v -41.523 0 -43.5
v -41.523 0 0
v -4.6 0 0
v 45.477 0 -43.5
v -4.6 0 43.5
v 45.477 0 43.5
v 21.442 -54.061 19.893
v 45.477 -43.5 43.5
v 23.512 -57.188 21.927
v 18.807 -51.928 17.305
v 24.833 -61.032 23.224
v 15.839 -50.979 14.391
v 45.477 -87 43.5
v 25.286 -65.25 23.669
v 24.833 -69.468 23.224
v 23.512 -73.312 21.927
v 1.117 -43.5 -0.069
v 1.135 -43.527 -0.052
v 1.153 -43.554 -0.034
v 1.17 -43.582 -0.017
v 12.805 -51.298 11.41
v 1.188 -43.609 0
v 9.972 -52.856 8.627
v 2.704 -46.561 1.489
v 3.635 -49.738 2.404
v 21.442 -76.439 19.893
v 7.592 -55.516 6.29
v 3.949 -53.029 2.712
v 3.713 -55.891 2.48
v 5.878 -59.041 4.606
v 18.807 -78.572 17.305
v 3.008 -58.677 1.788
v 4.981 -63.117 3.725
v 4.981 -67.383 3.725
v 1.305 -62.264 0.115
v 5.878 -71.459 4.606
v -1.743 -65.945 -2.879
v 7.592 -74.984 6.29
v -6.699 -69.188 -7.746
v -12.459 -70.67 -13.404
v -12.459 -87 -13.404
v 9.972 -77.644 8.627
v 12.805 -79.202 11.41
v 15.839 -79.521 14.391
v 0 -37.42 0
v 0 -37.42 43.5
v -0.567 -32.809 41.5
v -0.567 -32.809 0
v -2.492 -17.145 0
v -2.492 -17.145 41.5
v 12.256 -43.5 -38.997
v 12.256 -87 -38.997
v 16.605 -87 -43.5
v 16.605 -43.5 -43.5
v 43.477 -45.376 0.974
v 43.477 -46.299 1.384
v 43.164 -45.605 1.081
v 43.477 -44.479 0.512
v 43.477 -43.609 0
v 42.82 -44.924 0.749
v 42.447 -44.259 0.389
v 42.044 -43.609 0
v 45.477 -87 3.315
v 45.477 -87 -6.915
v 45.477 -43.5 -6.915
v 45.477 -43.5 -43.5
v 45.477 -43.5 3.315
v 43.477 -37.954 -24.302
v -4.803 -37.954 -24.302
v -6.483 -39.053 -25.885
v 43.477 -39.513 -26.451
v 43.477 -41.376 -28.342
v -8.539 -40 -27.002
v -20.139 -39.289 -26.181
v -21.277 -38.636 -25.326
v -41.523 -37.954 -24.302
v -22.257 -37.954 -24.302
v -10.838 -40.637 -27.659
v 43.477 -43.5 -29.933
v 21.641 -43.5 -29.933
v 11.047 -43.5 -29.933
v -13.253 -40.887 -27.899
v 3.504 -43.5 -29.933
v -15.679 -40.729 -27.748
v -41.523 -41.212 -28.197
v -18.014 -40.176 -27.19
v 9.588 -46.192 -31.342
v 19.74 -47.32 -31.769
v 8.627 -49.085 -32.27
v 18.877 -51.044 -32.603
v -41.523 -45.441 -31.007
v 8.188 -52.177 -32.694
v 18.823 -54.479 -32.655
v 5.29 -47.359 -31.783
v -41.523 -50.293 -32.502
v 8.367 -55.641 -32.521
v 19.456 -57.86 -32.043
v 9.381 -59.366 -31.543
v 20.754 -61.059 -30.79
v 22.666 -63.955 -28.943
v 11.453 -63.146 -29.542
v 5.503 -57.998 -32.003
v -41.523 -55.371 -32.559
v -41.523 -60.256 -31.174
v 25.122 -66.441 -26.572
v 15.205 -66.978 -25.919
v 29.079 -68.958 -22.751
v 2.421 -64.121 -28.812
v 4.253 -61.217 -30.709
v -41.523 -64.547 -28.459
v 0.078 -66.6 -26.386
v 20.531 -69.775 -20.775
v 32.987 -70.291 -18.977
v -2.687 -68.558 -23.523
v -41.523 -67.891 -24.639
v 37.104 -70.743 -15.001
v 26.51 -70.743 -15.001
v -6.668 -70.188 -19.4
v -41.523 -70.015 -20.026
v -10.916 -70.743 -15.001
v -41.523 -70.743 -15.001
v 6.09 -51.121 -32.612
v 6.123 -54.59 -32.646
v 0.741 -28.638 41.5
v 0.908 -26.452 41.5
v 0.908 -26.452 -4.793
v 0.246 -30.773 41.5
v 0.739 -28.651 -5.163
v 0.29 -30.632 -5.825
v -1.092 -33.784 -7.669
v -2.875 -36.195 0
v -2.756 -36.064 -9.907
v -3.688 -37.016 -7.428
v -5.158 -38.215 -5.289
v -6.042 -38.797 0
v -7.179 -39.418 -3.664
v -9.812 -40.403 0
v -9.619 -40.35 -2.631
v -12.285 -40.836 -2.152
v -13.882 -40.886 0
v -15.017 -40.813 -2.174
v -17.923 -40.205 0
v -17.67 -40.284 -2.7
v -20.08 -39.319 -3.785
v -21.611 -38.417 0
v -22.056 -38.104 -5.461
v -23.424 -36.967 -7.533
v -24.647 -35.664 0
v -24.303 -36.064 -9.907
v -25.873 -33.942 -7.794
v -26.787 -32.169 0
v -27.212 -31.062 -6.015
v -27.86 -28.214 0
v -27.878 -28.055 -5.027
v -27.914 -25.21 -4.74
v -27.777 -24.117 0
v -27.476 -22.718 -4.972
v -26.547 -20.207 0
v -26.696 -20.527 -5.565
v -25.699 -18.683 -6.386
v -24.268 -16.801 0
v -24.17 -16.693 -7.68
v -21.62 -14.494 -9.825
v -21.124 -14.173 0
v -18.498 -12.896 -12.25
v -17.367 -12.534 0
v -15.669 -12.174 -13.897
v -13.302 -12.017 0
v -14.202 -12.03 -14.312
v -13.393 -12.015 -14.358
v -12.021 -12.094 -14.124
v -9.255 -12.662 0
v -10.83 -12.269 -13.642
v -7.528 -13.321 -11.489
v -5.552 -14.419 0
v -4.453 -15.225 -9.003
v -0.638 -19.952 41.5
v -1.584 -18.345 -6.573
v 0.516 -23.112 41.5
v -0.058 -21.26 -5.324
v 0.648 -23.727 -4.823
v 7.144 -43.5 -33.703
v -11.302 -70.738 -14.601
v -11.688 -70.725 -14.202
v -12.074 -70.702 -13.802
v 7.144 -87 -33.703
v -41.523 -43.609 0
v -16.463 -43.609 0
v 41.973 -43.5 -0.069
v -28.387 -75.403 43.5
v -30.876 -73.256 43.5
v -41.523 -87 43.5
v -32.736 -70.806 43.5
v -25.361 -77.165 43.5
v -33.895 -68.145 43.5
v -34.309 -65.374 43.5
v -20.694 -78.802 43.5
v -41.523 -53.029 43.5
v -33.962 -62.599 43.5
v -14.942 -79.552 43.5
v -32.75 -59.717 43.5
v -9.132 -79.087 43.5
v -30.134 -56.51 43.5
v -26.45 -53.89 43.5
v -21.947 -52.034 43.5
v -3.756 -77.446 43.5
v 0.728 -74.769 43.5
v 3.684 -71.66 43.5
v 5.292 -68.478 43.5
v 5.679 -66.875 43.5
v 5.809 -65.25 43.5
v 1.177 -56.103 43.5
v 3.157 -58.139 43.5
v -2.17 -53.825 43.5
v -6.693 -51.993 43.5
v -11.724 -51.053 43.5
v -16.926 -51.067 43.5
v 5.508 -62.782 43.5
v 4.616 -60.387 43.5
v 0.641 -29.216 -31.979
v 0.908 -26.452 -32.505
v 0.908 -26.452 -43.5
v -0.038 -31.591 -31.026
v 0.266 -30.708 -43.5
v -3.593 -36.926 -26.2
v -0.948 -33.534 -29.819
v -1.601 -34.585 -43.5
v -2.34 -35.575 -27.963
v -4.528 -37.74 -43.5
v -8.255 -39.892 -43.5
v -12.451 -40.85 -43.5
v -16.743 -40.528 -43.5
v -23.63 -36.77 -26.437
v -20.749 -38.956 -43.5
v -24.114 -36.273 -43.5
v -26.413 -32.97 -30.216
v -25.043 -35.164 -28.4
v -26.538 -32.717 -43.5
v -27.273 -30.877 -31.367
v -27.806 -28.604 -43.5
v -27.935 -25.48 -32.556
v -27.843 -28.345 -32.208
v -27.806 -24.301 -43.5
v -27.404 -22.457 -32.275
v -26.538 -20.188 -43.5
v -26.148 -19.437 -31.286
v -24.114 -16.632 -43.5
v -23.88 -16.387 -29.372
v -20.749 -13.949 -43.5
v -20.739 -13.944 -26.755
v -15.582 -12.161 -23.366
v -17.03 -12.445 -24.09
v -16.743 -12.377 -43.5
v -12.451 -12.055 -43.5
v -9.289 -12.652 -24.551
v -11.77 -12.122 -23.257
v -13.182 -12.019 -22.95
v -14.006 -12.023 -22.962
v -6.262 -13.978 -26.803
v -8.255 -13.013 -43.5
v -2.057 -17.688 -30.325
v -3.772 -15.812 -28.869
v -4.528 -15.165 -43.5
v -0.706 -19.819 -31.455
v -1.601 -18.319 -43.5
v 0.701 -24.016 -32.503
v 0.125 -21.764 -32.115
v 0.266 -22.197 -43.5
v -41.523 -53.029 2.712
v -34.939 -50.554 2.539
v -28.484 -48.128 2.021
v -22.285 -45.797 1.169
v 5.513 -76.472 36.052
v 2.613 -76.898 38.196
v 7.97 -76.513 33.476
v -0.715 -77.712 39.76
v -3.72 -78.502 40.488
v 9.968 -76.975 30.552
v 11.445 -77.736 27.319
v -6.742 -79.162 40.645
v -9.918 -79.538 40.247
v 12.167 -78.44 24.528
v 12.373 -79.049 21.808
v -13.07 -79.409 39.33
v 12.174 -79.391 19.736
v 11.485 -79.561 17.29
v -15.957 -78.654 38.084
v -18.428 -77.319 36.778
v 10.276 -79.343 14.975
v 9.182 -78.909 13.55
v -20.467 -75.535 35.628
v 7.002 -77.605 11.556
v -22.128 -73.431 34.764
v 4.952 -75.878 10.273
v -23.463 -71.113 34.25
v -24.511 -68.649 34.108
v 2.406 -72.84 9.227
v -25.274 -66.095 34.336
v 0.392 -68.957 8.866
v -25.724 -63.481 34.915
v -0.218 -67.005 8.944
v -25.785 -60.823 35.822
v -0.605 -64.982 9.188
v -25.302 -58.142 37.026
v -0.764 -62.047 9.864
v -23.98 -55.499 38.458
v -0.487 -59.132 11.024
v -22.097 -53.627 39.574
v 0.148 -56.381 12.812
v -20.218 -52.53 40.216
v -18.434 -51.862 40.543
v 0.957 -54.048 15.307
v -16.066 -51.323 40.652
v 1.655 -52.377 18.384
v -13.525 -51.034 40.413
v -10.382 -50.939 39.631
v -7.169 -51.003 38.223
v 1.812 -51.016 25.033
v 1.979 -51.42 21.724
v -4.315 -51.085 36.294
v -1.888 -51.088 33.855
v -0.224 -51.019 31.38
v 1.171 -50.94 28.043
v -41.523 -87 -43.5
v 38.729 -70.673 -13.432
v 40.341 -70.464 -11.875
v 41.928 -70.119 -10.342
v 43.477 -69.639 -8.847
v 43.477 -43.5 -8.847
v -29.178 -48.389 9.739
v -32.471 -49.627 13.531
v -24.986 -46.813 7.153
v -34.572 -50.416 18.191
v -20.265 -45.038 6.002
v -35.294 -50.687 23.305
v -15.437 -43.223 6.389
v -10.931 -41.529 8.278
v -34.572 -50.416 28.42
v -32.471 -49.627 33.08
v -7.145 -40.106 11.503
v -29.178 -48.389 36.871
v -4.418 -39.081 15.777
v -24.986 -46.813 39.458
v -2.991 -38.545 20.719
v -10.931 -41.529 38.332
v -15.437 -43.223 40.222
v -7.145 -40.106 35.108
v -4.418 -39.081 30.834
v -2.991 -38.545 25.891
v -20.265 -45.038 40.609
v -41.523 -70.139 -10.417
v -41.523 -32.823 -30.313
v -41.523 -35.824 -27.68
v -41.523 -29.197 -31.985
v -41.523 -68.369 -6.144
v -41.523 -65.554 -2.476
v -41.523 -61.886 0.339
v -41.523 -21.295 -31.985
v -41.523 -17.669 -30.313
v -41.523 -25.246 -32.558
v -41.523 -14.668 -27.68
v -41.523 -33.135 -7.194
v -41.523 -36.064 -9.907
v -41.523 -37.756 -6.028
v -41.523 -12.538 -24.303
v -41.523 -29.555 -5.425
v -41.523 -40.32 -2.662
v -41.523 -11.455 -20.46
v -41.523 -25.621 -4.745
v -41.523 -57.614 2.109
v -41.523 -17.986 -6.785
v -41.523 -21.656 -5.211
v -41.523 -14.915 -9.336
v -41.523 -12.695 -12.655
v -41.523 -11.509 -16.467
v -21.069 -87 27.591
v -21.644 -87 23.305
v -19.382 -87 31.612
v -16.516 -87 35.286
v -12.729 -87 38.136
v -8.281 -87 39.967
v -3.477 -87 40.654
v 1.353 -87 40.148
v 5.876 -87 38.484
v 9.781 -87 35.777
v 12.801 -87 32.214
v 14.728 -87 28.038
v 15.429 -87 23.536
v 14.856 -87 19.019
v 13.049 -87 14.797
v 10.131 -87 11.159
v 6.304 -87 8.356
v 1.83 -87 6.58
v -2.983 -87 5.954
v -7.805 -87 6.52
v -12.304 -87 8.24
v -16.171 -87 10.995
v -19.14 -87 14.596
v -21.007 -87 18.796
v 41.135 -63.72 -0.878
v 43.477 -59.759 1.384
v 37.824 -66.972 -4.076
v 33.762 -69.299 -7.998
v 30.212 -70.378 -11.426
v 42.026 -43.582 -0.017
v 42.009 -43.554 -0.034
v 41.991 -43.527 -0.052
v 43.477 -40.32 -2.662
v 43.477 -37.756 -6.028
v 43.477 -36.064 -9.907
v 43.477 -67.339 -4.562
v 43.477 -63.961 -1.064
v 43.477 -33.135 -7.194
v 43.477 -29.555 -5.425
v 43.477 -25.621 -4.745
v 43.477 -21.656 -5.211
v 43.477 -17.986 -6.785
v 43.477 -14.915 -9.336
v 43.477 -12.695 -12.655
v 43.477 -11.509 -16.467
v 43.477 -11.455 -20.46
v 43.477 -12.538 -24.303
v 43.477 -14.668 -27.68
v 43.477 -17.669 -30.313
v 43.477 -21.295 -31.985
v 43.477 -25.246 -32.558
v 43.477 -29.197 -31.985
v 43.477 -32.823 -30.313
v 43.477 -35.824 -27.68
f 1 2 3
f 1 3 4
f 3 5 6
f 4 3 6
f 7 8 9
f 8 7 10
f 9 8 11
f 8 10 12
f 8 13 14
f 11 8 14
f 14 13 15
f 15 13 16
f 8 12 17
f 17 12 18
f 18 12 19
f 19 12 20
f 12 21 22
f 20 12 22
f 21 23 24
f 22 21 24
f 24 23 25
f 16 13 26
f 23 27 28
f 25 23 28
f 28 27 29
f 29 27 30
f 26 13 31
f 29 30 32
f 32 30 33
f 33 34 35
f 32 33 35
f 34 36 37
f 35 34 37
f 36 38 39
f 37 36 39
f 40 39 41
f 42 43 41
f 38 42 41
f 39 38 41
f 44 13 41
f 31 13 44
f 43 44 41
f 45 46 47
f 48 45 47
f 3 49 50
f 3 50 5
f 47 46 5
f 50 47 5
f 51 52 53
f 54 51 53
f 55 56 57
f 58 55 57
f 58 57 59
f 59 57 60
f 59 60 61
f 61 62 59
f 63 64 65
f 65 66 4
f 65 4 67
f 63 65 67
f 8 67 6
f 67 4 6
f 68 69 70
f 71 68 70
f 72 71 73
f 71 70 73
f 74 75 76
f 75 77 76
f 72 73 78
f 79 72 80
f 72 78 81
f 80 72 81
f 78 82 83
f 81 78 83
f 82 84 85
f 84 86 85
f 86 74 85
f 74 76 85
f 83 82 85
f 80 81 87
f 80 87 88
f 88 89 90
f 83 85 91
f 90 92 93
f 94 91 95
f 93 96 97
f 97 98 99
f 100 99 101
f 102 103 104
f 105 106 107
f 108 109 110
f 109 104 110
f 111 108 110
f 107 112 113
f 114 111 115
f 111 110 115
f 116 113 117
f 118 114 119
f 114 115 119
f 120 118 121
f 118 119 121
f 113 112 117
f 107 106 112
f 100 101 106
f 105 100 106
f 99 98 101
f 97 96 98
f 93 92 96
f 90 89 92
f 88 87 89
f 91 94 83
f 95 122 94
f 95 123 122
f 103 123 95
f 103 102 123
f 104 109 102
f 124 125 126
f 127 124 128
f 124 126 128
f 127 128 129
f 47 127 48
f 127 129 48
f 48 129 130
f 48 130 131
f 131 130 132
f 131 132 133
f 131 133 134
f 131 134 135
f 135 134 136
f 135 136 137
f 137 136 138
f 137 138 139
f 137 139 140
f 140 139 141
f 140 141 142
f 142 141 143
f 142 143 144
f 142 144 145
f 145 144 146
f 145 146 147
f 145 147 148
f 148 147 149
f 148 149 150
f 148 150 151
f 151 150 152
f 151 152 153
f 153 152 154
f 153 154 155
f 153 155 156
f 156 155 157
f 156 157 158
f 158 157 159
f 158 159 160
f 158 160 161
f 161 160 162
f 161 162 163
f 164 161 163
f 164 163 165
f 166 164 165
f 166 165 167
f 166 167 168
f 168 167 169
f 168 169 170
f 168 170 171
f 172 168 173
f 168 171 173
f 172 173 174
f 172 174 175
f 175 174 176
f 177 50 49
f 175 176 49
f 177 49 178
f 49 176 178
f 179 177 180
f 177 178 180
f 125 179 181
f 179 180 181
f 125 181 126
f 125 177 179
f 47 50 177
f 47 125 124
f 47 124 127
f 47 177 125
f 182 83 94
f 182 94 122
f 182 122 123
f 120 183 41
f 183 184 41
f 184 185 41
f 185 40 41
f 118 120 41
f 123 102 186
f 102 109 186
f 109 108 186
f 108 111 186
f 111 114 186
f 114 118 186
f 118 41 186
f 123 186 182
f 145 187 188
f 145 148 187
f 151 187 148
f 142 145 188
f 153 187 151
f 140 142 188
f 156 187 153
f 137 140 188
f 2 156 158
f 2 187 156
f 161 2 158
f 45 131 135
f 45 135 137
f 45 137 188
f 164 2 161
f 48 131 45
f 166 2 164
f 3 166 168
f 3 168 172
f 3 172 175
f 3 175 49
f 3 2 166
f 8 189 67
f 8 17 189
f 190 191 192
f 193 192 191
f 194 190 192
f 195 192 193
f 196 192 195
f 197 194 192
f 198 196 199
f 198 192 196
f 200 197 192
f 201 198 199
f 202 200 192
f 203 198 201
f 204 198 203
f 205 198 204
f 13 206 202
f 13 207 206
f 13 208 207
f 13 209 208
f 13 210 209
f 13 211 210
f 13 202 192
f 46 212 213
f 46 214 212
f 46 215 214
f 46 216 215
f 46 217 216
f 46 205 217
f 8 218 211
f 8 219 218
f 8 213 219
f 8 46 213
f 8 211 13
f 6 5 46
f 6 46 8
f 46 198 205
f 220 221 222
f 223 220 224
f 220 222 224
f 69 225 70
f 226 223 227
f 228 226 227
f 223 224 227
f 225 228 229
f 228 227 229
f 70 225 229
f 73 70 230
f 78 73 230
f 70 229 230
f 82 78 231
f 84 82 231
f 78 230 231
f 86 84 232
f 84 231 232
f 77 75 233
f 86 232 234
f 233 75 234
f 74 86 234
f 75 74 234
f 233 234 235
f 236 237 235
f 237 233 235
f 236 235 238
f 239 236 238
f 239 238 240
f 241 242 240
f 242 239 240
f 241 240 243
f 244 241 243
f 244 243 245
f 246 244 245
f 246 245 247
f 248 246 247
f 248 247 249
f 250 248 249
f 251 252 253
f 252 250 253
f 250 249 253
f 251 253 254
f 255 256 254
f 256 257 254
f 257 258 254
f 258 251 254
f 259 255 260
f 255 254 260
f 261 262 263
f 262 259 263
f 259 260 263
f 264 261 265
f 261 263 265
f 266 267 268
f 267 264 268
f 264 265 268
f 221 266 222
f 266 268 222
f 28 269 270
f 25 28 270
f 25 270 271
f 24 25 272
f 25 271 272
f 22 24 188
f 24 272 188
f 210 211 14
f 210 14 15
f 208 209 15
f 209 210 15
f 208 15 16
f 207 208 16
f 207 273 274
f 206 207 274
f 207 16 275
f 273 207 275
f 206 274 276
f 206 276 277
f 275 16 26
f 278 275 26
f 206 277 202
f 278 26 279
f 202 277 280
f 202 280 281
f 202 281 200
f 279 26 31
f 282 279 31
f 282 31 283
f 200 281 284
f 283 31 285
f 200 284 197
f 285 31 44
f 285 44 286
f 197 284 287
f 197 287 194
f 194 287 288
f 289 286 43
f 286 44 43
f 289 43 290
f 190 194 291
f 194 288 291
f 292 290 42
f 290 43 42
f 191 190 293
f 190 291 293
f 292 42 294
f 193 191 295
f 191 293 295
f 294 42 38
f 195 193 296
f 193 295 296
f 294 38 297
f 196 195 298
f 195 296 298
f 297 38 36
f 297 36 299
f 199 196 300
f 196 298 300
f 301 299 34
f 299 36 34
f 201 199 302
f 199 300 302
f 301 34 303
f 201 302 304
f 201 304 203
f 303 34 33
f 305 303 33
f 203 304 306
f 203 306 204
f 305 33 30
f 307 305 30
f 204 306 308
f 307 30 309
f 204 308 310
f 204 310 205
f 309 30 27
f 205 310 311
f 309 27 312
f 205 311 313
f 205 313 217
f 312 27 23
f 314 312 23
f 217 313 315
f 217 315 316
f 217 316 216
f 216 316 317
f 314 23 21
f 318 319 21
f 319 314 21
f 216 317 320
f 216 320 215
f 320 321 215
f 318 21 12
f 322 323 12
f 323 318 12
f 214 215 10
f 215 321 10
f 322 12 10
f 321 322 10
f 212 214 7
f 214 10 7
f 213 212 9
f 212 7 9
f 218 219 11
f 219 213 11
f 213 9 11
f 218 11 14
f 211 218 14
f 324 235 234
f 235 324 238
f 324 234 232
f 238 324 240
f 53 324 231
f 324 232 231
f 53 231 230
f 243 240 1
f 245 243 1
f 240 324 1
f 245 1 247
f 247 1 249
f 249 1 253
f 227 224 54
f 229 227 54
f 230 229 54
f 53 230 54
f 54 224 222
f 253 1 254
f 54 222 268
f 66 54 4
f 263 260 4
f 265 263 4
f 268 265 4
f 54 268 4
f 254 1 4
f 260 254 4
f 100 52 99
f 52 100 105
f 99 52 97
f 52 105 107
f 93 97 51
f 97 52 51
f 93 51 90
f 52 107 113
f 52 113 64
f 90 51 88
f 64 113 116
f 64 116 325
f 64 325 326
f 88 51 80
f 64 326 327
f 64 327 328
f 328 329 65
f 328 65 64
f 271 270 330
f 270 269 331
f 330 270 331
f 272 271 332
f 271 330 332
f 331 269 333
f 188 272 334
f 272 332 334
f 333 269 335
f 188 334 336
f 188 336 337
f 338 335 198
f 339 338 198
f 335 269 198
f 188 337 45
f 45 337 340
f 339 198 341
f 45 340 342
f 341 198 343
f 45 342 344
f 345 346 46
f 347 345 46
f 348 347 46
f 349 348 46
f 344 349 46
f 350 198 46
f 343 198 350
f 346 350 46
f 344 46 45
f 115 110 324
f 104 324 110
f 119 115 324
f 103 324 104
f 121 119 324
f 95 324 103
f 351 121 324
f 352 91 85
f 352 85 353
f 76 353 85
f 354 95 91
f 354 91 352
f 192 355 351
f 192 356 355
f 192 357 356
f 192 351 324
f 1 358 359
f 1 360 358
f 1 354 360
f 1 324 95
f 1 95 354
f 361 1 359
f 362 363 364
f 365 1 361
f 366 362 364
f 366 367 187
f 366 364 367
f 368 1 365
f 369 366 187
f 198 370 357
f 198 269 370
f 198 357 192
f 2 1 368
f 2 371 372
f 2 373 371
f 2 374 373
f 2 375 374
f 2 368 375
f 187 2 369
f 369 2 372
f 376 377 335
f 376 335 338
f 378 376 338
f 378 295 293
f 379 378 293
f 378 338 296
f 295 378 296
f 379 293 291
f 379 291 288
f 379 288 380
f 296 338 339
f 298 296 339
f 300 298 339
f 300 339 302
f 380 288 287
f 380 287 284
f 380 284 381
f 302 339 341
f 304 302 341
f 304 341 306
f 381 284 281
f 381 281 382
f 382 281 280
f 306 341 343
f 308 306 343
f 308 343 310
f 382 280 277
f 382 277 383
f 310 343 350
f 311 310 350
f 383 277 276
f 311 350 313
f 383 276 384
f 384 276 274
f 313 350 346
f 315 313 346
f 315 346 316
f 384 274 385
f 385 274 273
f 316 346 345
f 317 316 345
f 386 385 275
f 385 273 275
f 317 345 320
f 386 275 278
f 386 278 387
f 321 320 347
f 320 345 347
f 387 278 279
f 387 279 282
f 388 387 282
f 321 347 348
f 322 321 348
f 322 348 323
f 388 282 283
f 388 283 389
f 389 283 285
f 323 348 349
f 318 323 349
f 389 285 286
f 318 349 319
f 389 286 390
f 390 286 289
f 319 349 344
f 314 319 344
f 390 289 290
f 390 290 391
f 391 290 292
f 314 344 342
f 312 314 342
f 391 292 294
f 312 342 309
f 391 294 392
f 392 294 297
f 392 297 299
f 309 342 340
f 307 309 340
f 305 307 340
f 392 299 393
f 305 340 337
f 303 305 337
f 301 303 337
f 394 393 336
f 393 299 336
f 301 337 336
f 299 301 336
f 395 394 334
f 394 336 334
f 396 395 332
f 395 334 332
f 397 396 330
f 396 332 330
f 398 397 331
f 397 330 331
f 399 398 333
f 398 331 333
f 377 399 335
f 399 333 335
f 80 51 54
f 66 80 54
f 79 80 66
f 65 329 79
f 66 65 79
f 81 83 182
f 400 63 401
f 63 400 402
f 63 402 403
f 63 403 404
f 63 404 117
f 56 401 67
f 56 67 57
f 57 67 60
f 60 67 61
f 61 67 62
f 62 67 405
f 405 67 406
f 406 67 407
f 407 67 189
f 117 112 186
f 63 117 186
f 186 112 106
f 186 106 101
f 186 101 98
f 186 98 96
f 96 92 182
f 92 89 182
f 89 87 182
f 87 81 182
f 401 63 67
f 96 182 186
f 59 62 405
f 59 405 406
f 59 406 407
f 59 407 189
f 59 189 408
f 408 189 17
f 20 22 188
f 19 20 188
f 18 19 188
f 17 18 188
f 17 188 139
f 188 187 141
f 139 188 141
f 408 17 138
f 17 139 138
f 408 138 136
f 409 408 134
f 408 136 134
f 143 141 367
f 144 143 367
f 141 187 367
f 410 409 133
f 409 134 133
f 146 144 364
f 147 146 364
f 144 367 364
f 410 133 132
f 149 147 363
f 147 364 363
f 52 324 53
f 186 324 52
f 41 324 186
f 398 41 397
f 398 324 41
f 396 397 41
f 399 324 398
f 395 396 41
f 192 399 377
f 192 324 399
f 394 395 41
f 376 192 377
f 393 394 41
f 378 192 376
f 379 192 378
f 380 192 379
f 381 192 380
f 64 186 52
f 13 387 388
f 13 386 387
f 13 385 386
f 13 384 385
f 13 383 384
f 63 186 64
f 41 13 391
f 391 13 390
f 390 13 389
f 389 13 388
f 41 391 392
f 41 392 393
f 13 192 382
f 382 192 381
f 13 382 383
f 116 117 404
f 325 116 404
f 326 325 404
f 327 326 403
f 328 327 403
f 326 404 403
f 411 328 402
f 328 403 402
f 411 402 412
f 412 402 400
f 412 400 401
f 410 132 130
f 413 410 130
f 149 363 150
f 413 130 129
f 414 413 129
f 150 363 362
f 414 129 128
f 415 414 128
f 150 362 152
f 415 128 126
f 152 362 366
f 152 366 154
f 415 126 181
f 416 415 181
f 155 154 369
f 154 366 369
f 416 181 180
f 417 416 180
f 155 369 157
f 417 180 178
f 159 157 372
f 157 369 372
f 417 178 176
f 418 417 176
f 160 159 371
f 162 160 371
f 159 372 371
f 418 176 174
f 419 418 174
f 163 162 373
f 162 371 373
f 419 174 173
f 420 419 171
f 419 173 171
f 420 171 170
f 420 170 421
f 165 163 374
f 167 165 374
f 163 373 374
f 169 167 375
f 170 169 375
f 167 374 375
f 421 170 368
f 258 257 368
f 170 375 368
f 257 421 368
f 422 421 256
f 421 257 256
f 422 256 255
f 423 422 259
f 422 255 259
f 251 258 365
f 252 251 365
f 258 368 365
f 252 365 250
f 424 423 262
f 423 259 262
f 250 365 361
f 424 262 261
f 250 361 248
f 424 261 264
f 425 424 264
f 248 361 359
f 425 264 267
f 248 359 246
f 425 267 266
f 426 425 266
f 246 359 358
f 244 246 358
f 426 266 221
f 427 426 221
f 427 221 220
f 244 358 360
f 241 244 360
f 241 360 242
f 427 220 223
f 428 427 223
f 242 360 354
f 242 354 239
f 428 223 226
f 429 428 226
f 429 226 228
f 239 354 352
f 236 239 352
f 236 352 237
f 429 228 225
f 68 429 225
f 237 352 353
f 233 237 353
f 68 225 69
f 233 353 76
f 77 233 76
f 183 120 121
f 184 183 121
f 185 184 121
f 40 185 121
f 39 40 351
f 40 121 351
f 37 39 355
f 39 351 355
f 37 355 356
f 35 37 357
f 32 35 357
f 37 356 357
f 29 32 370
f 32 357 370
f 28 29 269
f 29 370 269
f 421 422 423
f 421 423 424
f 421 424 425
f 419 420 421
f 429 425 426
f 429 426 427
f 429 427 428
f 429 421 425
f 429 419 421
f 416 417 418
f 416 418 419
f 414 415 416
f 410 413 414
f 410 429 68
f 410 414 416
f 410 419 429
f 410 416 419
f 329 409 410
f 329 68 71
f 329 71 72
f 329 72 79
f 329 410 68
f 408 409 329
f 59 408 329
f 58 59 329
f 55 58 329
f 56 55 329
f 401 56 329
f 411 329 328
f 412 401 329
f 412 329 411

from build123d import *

# Parameters (mm, degrees)
F0_W      = 87
F0_H      = 87
F1_DEPTH  = 87
F3_DEPTH  = 43.5
F5_DEPTH  = 43.5
F6_R      = 14.4377052149
F7_DEPTH  = 85
F8_R      = 13.9088324257
F9_DEPTH  = 85
F10_R     = 14.310913908
F11_DEPTH = 87
F13_DEPTH = 43.5
F15_DEPTH = 85
F16_R     = 17.3517727339
F17_DEPTH = 87


with BuildPart() as f1:
    # F0 (on Front) → F1 (new body)
    with BuildSketch(Plane.XZ):
        with Locations((1.9772734489, 0)):
            Rectangle(F0_W, F0_H)
    extrude(amount=F1_DEPTH)

    # F2 (on face) → F3 (cut)
    with BuildSketch(Plane.XY.offset(43.5)):
        Polygon((-41.5227265511, 0), (-41.5227265511, -53.0289933085), (0, -37.420453267), (-4.6001030132, 0), align=None)
    extrude(amount=-F3_DEPTH, mode=Mode.SUBTRACT)

    # F4 (on face) → F5 (cut)
    with BuildSketch(Plane.XZ.offset(87)):
        Polygon((45.4772734489, 43.5), (-12.4589475545, -13.403512232), (16.6048314422, -43.5), (45.4772734489, -43.5), align=None)
    extrude(amount=-F5_DEPTH, mode=Mode.SUBTRACT)

    # F6 (on face) → F7 (cut)
    with BuildSketch(Plane(origin=(0, 0, -43.5), x_dir=(1, 0, 0), z_dir=(0, 0, -1))):
        with Locations((-13.5299172252, 26.452422142)):
            Circle(F6_R)
    extrude(amount=-F7_DEPTH, mode=Mode.SUBTRACT)

    # F8 (on face) → F9 (cut)
    with BuildSketch(Plane(origin=(-41.5227265511, 0, 0), x_dir=(0, -1, 0), z_dir=(-1, 0, 0))):
        with Locations((25.2458769828, -18.6489578336)):
            Circle(F8_R)
    extrude(amount=-F9_DEPTH, mode=Mode.SUBTRACT)

    # F10 (on face) → F11 (cut)
    with BuildSketch(Plane(origin=(0.5832279038, 0, -0.593812568), x_dir=(0.7134366695, 0, 0.7007197147), z_dir=(0.7007197147, 0, -0.7134366695))):
        with Locations((20.3147400171, 65.25)):
            Circle(F10_R)
    extrude(amount=-F11_DEPTH, mode=Mode.SUBTRACT)

    # F12 (on face) → F13 (join)
    with BuildSketch(Plane.XZ.offset(43.5)):
        Polygon((45.4772734489, 3.3152910087), (7.1438206622, -33.7028158401), (12.2559760747, -38.9966189225), (45.4772734489, -6.9152527408), align=None)
    extrude(amount=F13_DEPTH)

    # F14 (on face) → F15 (cut)
    with BuildSketch(Plane(origin=(-41.5227265511, 0, 0), x_dir=(0, -1, 0), z_dir=(-1, 0, 0))):
        with BuildLine():
            ThreePointArc((37.9539034635, -24.3024242405), (57.8630917211, -32.0424114958), (70.742568812, -15.001218766))
            ThreePointArc((70.742568812, -15.001218766), (65.5543826661, -2.4758294084), (53.0289933085, 2.7123567374))
            Line((53.0289933085, 2.7123567374), (53.0289933085, 0))
            Line((53.0289933085, 0), (43.6091104722, 0))
            ThreePointArc((43.6091104722, 0), (38.9372170577, -4.2684372434), (36.0638383113, -9.9066851234))
            ThreePointArc((36.0638383113, -9.9066851234), (38.3592447949, -14.0126657732), (39.1547094085, -18.6489578336))
            ThreePointArc((39.1547094085, -18.6489578336), (38.8511963511, -21.5387509634), (37.9539034635, -24.3024242405))
        make_face()
        with BuildLine():
            Line((53.0289933085, 0), (53.0289933085, 2.7123567374))
            ThreePointArc((53.0289933085, 2.7123567374), (48.1276906317, 2.0207666994), (43.6091104722, 0))
            Line((43.6091104722, 0), (53.0289933085, 0))
        make_face()
    extrude(amount=-F15_DEPTH, mode=Mode.SUBTRACT)

    # F16 (on face) → F17 (cut)
    with BuildSketch(Plane(origin=(12.3249261037, -32.7874698726, 0), x_dir=(-0.9360508251, -0.3518648219, 0), z_dir=(-0.3518648219, 0.9360508251, 0))):
        with Locations((33.5201099515, 23.305317387)):
            Circle(F16_R)
    extrude(amount=-F17_DEPTH, mode=Mode.SUBTRACT)


solid = f1.part
